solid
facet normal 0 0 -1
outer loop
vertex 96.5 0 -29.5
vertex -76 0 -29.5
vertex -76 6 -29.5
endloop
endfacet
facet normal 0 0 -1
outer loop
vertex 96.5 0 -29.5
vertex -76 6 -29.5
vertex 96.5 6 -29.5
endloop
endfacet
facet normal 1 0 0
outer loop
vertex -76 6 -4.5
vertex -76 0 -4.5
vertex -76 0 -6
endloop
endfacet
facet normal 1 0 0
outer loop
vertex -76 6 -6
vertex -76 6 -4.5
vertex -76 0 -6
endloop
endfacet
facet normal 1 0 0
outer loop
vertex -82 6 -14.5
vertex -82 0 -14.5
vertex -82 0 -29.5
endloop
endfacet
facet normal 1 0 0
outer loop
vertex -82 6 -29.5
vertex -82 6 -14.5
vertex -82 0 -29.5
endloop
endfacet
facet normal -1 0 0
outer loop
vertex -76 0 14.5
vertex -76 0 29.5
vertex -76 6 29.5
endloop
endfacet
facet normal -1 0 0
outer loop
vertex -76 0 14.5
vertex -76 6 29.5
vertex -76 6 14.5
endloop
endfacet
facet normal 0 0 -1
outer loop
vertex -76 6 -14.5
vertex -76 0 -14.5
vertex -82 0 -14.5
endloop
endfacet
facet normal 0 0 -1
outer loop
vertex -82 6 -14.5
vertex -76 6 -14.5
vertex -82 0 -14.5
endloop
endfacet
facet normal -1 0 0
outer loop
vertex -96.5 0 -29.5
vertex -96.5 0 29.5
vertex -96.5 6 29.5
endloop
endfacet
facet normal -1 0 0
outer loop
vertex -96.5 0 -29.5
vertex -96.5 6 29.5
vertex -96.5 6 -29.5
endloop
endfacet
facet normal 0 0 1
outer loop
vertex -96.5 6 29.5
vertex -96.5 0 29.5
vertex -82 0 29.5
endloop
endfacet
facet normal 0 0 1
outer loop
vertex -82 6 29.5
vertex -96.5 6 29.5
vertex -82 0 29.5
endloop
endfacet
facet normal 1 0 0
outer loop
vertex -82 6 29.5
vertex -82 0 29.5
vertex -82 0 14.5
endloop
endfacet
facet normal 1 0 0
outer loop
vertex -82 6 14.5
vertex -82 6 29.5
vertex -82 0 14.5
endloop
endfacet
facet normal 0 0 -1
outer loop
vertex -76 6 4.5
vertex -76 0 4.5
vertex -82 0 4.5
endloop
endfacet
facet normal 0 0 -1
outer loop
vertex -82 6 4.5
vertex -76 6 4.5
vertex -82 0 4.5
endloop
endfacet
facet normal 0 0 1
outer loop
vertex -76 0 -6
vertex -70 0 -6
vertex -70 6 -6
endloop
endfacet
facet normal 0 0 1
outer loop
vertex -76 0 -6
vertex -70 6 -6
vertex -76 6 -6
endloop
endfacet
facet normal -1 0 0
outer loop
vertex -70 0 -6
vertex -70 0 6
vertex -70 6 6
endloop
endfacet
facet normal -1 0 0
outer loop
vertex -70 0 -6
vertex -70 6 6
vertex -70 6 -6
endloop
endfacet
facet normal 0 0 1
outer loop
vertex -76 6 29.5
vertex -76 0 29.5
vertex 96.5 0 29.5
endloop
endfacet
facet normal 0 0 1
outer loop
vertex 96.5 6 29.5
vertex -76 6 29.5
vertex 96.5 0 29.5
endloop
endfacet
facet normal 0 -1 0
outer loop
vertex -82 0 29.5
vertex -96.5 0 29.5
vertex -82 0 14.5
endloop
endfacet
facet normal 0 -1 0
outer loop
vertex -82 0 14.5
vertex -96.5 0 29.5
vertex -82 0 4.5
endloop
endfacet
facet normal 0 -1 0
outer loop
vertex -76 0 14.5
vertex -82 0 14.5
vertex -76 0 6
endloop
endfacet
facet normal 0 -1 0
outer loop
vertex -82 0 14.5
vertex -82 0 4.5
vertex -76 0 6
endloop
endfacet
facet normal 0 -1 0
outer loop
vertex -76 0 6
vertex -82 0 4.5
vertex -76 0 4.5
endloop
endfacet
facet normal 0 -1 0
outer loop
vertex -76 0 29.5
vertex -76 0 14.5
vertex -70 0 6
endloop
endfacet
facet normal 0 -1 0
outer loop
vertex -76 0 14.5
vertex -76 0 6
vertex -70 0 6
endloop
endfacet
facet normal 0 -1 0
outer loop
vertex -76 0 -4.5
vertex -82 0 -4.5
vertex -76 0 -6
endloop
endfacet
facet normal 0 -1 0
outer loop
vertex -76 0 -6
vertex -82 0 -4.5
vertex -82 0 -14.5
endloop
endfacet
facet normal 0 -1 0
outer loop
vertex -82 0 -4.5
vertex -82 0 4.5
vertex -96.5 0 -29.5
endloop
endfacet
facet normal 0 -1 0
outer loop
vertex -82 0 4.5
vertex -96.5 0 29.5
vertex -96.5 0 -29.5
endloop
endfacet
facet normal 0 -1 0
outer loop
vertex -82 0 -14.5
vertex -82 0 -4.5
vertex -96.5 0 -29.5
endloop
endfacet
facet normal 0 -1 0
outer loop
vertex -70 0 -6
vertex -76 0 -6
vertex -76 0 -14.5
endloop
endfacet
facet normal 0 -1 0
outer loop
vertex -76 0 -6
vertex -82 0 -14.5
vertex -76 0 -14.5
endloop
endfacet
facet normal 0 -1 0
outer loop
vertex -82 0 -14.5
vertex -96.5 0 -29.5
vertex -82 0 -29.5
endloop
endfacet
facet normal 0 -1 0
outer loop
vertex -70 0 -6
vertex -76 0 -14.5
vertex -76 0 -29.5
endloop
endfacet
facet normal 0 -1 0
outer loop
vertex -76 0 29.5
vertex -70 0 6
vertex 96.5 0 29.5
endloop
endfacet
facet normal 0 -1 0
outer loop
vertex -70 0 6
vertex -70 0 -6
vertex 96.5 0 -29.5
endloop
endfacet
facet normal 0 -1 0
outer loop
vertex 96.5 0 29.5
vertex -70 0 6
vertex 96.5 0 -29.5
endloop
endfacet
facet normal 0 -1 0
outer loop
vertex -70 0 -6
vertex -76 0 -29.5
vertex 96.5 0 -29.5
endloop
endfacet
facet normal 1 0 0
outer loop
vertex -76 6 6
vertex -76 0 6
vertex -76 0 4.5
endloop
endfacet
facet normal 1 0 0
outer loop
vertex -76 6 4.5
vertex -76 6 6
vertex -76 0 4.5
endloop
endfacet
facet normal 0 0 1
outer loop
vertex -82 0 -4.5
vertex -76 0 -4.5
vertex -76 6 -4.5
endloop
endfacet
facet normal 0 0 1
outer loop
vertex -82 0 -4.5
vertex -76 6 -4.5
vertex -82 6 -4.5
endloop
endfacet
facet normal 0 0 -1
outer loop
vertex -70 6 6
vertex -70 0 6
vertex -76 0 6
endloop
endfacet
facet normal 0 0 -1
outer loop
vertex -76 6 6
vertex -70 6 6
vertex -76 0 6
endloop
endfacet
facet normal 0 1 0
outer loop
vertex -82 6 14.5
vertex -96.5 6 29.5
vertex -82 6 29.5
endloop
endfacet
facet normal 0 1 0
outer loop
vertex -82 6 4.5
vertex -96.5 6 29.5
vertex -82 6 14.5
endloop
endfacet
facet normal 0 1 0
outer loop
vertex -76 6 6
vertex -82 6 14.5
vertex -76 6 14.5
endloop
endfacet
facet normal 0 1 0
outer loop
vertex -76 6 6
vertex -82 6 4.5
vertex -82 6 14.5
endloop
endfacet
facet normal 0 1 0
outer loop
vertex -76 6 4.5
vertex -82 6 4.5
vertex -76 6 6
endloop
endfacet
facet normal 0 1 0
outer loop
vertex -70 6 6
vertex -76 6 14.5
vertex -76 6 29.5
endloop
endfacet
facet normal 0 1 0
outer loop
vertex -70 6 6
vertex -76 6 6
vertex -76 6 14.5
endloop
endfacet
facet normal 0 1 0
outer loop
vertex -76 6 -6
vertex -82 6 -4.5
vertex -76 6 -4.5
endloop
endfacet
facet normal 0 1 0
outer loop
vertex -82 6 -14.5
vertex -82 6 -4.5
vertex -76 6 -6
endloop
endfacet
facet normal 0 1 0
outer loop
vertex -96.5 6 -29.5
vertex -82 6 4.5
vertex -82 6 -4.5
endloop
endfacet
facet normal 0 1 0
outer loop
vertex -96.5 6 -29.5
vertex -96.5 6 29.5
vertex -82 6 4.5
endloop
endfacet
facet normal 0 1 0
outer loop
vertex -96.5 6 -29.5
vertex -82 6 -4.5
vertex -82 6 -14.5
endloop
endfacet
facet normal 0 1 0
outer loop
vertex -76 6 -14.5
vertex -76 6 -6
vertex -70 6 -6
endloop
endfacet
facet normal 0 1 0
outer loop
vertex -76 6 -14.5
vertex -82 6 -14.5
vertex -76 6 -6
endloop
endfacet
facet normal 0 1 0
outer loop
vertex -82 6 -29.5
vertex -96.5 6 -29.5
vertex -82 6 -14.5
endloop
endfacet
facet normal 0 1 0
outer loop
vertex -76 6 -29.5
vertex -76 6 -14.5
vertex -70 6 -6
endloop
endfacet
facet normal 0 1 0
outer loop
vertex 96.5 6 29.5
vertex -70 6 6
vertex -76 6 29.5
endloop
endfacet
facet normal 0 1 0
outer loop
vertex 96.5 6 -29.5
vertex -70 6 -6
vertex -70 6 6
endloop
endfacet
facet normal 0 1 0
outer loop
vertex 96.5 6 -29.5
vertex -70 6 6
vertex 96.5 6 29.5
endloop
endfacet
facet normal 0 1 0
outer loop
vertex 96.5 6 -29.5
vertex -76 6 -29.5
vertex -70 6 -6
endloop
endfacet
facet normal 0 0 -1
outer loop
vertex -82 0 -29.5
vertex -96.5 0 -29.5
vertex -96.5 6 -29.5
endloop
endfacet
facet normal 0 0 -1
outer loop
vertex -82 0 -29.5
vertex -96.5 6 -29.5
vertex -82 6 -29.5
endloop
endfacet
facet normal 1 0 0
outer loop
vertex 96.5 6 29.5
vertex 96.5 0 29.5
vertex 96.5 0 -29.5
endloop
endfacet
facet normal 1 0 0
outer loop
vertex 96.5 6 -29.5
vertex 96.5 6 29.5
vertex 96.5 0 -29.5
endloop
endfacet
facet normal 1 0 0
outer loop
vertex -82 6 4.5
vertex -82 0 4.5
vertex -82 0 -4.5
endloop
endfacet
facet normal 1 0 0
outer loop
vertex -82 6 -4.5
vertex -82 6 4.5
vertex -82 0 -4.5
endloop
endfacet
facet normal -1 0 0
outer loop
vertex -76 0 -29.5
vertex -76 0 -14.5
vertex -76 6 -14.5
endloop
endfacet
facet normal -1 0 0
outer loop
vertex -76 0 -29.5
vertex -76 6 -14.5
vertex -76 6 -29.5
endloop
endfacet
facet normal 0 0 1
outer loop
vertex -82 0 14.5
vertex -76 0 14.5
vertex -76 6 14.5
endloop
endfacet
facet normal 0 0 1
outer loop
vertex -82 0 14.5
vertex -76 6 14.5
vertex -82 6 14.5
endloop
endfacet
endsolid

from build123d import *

# Parameters (mm, degrees)
SKETCH1_W           = 193
SKETCH1_H           = 59
BOSS_EXTRUDE1_DEPTH = 6
SKETCH3_W           = 6
SKETCH3_H           = 15
SKETCH3_H_2         = 9
SKETCH3_H_3         = 12
CUT_EXTRUDE1_DEPTH  = 7
SKETCH4_W           = 199.10755054
SKETCH4_H           = 40.828336107
CUT_EXTRUDE2_DEPTH  = 7


with BuildPart() as part:
    # Sketch1 → Boss-Extrude1 (new body)
    with BuildSketch(Plane(origin=(0, 0, 0), x_dir=(1, 0, 0), z_dir=(0, 1, 0))):
        Rectangle(SKETCH1_W, SKETCH1_H)
    extrude(amount=BOSS_EXTRUDE1_DEPTH)

    # Sketch3 → Cut-Extrude1 (cut, through all)
    with BuildSketch(Plane(origin=(0, 0, 0), x_dir=(-1, 0, 0), z_dir=(0, -1, 0))):
        with Locations((79, 22)):
            Rectangle(SKETCH3_W, SKETCH3_H)
        with Locations((79, -22)):
            Rectangle(SKETCH3_W, SKETCH3_H)
        with Locations((79, 0)):
            Rectangle(SKETCH3_W, SKETCH3_H_2)
        with Locations((73, 0)):
            Rectangle(SKETCH3_W, SKETCH3_H_3)
    extrude(amount=-CUT_EXTRUDE1_DEPTH, mode=Mode.SUBTRACT)

    # Sketch4 → Cut-Extrude2 (cut, through all)
    with BuildSketch(Plane.XZ):
        with Locations((-141.775997492, -49.914168053)):
            Rectangle(SKETCH4_W, SKETCH4_H)
        with Locations((-107.998219714, -49.914168053)):
            Rectangle(SKETCH4_W, SKETCH4_H)
    cut_extrude2 = extrude(amount=-CUT_EXTRUDE2_DEPTH, mode=Mode.SUBTRACT)

    # Mirror1: Cut-Extrude2 across plane
    add(cut_extrude2.mirror(Plane.XY), mode=Mode.SUBTRACT)

    # Mirror2: Cut-Extrude2 across plane
    add(cut_extrude2.mirror(Plane(origin=(0, 0, 0), x_dir=(0, 0, 1), z_dir=(1, 0, 0))), mode=Mode.SUBTRACT)


solid = part.part
